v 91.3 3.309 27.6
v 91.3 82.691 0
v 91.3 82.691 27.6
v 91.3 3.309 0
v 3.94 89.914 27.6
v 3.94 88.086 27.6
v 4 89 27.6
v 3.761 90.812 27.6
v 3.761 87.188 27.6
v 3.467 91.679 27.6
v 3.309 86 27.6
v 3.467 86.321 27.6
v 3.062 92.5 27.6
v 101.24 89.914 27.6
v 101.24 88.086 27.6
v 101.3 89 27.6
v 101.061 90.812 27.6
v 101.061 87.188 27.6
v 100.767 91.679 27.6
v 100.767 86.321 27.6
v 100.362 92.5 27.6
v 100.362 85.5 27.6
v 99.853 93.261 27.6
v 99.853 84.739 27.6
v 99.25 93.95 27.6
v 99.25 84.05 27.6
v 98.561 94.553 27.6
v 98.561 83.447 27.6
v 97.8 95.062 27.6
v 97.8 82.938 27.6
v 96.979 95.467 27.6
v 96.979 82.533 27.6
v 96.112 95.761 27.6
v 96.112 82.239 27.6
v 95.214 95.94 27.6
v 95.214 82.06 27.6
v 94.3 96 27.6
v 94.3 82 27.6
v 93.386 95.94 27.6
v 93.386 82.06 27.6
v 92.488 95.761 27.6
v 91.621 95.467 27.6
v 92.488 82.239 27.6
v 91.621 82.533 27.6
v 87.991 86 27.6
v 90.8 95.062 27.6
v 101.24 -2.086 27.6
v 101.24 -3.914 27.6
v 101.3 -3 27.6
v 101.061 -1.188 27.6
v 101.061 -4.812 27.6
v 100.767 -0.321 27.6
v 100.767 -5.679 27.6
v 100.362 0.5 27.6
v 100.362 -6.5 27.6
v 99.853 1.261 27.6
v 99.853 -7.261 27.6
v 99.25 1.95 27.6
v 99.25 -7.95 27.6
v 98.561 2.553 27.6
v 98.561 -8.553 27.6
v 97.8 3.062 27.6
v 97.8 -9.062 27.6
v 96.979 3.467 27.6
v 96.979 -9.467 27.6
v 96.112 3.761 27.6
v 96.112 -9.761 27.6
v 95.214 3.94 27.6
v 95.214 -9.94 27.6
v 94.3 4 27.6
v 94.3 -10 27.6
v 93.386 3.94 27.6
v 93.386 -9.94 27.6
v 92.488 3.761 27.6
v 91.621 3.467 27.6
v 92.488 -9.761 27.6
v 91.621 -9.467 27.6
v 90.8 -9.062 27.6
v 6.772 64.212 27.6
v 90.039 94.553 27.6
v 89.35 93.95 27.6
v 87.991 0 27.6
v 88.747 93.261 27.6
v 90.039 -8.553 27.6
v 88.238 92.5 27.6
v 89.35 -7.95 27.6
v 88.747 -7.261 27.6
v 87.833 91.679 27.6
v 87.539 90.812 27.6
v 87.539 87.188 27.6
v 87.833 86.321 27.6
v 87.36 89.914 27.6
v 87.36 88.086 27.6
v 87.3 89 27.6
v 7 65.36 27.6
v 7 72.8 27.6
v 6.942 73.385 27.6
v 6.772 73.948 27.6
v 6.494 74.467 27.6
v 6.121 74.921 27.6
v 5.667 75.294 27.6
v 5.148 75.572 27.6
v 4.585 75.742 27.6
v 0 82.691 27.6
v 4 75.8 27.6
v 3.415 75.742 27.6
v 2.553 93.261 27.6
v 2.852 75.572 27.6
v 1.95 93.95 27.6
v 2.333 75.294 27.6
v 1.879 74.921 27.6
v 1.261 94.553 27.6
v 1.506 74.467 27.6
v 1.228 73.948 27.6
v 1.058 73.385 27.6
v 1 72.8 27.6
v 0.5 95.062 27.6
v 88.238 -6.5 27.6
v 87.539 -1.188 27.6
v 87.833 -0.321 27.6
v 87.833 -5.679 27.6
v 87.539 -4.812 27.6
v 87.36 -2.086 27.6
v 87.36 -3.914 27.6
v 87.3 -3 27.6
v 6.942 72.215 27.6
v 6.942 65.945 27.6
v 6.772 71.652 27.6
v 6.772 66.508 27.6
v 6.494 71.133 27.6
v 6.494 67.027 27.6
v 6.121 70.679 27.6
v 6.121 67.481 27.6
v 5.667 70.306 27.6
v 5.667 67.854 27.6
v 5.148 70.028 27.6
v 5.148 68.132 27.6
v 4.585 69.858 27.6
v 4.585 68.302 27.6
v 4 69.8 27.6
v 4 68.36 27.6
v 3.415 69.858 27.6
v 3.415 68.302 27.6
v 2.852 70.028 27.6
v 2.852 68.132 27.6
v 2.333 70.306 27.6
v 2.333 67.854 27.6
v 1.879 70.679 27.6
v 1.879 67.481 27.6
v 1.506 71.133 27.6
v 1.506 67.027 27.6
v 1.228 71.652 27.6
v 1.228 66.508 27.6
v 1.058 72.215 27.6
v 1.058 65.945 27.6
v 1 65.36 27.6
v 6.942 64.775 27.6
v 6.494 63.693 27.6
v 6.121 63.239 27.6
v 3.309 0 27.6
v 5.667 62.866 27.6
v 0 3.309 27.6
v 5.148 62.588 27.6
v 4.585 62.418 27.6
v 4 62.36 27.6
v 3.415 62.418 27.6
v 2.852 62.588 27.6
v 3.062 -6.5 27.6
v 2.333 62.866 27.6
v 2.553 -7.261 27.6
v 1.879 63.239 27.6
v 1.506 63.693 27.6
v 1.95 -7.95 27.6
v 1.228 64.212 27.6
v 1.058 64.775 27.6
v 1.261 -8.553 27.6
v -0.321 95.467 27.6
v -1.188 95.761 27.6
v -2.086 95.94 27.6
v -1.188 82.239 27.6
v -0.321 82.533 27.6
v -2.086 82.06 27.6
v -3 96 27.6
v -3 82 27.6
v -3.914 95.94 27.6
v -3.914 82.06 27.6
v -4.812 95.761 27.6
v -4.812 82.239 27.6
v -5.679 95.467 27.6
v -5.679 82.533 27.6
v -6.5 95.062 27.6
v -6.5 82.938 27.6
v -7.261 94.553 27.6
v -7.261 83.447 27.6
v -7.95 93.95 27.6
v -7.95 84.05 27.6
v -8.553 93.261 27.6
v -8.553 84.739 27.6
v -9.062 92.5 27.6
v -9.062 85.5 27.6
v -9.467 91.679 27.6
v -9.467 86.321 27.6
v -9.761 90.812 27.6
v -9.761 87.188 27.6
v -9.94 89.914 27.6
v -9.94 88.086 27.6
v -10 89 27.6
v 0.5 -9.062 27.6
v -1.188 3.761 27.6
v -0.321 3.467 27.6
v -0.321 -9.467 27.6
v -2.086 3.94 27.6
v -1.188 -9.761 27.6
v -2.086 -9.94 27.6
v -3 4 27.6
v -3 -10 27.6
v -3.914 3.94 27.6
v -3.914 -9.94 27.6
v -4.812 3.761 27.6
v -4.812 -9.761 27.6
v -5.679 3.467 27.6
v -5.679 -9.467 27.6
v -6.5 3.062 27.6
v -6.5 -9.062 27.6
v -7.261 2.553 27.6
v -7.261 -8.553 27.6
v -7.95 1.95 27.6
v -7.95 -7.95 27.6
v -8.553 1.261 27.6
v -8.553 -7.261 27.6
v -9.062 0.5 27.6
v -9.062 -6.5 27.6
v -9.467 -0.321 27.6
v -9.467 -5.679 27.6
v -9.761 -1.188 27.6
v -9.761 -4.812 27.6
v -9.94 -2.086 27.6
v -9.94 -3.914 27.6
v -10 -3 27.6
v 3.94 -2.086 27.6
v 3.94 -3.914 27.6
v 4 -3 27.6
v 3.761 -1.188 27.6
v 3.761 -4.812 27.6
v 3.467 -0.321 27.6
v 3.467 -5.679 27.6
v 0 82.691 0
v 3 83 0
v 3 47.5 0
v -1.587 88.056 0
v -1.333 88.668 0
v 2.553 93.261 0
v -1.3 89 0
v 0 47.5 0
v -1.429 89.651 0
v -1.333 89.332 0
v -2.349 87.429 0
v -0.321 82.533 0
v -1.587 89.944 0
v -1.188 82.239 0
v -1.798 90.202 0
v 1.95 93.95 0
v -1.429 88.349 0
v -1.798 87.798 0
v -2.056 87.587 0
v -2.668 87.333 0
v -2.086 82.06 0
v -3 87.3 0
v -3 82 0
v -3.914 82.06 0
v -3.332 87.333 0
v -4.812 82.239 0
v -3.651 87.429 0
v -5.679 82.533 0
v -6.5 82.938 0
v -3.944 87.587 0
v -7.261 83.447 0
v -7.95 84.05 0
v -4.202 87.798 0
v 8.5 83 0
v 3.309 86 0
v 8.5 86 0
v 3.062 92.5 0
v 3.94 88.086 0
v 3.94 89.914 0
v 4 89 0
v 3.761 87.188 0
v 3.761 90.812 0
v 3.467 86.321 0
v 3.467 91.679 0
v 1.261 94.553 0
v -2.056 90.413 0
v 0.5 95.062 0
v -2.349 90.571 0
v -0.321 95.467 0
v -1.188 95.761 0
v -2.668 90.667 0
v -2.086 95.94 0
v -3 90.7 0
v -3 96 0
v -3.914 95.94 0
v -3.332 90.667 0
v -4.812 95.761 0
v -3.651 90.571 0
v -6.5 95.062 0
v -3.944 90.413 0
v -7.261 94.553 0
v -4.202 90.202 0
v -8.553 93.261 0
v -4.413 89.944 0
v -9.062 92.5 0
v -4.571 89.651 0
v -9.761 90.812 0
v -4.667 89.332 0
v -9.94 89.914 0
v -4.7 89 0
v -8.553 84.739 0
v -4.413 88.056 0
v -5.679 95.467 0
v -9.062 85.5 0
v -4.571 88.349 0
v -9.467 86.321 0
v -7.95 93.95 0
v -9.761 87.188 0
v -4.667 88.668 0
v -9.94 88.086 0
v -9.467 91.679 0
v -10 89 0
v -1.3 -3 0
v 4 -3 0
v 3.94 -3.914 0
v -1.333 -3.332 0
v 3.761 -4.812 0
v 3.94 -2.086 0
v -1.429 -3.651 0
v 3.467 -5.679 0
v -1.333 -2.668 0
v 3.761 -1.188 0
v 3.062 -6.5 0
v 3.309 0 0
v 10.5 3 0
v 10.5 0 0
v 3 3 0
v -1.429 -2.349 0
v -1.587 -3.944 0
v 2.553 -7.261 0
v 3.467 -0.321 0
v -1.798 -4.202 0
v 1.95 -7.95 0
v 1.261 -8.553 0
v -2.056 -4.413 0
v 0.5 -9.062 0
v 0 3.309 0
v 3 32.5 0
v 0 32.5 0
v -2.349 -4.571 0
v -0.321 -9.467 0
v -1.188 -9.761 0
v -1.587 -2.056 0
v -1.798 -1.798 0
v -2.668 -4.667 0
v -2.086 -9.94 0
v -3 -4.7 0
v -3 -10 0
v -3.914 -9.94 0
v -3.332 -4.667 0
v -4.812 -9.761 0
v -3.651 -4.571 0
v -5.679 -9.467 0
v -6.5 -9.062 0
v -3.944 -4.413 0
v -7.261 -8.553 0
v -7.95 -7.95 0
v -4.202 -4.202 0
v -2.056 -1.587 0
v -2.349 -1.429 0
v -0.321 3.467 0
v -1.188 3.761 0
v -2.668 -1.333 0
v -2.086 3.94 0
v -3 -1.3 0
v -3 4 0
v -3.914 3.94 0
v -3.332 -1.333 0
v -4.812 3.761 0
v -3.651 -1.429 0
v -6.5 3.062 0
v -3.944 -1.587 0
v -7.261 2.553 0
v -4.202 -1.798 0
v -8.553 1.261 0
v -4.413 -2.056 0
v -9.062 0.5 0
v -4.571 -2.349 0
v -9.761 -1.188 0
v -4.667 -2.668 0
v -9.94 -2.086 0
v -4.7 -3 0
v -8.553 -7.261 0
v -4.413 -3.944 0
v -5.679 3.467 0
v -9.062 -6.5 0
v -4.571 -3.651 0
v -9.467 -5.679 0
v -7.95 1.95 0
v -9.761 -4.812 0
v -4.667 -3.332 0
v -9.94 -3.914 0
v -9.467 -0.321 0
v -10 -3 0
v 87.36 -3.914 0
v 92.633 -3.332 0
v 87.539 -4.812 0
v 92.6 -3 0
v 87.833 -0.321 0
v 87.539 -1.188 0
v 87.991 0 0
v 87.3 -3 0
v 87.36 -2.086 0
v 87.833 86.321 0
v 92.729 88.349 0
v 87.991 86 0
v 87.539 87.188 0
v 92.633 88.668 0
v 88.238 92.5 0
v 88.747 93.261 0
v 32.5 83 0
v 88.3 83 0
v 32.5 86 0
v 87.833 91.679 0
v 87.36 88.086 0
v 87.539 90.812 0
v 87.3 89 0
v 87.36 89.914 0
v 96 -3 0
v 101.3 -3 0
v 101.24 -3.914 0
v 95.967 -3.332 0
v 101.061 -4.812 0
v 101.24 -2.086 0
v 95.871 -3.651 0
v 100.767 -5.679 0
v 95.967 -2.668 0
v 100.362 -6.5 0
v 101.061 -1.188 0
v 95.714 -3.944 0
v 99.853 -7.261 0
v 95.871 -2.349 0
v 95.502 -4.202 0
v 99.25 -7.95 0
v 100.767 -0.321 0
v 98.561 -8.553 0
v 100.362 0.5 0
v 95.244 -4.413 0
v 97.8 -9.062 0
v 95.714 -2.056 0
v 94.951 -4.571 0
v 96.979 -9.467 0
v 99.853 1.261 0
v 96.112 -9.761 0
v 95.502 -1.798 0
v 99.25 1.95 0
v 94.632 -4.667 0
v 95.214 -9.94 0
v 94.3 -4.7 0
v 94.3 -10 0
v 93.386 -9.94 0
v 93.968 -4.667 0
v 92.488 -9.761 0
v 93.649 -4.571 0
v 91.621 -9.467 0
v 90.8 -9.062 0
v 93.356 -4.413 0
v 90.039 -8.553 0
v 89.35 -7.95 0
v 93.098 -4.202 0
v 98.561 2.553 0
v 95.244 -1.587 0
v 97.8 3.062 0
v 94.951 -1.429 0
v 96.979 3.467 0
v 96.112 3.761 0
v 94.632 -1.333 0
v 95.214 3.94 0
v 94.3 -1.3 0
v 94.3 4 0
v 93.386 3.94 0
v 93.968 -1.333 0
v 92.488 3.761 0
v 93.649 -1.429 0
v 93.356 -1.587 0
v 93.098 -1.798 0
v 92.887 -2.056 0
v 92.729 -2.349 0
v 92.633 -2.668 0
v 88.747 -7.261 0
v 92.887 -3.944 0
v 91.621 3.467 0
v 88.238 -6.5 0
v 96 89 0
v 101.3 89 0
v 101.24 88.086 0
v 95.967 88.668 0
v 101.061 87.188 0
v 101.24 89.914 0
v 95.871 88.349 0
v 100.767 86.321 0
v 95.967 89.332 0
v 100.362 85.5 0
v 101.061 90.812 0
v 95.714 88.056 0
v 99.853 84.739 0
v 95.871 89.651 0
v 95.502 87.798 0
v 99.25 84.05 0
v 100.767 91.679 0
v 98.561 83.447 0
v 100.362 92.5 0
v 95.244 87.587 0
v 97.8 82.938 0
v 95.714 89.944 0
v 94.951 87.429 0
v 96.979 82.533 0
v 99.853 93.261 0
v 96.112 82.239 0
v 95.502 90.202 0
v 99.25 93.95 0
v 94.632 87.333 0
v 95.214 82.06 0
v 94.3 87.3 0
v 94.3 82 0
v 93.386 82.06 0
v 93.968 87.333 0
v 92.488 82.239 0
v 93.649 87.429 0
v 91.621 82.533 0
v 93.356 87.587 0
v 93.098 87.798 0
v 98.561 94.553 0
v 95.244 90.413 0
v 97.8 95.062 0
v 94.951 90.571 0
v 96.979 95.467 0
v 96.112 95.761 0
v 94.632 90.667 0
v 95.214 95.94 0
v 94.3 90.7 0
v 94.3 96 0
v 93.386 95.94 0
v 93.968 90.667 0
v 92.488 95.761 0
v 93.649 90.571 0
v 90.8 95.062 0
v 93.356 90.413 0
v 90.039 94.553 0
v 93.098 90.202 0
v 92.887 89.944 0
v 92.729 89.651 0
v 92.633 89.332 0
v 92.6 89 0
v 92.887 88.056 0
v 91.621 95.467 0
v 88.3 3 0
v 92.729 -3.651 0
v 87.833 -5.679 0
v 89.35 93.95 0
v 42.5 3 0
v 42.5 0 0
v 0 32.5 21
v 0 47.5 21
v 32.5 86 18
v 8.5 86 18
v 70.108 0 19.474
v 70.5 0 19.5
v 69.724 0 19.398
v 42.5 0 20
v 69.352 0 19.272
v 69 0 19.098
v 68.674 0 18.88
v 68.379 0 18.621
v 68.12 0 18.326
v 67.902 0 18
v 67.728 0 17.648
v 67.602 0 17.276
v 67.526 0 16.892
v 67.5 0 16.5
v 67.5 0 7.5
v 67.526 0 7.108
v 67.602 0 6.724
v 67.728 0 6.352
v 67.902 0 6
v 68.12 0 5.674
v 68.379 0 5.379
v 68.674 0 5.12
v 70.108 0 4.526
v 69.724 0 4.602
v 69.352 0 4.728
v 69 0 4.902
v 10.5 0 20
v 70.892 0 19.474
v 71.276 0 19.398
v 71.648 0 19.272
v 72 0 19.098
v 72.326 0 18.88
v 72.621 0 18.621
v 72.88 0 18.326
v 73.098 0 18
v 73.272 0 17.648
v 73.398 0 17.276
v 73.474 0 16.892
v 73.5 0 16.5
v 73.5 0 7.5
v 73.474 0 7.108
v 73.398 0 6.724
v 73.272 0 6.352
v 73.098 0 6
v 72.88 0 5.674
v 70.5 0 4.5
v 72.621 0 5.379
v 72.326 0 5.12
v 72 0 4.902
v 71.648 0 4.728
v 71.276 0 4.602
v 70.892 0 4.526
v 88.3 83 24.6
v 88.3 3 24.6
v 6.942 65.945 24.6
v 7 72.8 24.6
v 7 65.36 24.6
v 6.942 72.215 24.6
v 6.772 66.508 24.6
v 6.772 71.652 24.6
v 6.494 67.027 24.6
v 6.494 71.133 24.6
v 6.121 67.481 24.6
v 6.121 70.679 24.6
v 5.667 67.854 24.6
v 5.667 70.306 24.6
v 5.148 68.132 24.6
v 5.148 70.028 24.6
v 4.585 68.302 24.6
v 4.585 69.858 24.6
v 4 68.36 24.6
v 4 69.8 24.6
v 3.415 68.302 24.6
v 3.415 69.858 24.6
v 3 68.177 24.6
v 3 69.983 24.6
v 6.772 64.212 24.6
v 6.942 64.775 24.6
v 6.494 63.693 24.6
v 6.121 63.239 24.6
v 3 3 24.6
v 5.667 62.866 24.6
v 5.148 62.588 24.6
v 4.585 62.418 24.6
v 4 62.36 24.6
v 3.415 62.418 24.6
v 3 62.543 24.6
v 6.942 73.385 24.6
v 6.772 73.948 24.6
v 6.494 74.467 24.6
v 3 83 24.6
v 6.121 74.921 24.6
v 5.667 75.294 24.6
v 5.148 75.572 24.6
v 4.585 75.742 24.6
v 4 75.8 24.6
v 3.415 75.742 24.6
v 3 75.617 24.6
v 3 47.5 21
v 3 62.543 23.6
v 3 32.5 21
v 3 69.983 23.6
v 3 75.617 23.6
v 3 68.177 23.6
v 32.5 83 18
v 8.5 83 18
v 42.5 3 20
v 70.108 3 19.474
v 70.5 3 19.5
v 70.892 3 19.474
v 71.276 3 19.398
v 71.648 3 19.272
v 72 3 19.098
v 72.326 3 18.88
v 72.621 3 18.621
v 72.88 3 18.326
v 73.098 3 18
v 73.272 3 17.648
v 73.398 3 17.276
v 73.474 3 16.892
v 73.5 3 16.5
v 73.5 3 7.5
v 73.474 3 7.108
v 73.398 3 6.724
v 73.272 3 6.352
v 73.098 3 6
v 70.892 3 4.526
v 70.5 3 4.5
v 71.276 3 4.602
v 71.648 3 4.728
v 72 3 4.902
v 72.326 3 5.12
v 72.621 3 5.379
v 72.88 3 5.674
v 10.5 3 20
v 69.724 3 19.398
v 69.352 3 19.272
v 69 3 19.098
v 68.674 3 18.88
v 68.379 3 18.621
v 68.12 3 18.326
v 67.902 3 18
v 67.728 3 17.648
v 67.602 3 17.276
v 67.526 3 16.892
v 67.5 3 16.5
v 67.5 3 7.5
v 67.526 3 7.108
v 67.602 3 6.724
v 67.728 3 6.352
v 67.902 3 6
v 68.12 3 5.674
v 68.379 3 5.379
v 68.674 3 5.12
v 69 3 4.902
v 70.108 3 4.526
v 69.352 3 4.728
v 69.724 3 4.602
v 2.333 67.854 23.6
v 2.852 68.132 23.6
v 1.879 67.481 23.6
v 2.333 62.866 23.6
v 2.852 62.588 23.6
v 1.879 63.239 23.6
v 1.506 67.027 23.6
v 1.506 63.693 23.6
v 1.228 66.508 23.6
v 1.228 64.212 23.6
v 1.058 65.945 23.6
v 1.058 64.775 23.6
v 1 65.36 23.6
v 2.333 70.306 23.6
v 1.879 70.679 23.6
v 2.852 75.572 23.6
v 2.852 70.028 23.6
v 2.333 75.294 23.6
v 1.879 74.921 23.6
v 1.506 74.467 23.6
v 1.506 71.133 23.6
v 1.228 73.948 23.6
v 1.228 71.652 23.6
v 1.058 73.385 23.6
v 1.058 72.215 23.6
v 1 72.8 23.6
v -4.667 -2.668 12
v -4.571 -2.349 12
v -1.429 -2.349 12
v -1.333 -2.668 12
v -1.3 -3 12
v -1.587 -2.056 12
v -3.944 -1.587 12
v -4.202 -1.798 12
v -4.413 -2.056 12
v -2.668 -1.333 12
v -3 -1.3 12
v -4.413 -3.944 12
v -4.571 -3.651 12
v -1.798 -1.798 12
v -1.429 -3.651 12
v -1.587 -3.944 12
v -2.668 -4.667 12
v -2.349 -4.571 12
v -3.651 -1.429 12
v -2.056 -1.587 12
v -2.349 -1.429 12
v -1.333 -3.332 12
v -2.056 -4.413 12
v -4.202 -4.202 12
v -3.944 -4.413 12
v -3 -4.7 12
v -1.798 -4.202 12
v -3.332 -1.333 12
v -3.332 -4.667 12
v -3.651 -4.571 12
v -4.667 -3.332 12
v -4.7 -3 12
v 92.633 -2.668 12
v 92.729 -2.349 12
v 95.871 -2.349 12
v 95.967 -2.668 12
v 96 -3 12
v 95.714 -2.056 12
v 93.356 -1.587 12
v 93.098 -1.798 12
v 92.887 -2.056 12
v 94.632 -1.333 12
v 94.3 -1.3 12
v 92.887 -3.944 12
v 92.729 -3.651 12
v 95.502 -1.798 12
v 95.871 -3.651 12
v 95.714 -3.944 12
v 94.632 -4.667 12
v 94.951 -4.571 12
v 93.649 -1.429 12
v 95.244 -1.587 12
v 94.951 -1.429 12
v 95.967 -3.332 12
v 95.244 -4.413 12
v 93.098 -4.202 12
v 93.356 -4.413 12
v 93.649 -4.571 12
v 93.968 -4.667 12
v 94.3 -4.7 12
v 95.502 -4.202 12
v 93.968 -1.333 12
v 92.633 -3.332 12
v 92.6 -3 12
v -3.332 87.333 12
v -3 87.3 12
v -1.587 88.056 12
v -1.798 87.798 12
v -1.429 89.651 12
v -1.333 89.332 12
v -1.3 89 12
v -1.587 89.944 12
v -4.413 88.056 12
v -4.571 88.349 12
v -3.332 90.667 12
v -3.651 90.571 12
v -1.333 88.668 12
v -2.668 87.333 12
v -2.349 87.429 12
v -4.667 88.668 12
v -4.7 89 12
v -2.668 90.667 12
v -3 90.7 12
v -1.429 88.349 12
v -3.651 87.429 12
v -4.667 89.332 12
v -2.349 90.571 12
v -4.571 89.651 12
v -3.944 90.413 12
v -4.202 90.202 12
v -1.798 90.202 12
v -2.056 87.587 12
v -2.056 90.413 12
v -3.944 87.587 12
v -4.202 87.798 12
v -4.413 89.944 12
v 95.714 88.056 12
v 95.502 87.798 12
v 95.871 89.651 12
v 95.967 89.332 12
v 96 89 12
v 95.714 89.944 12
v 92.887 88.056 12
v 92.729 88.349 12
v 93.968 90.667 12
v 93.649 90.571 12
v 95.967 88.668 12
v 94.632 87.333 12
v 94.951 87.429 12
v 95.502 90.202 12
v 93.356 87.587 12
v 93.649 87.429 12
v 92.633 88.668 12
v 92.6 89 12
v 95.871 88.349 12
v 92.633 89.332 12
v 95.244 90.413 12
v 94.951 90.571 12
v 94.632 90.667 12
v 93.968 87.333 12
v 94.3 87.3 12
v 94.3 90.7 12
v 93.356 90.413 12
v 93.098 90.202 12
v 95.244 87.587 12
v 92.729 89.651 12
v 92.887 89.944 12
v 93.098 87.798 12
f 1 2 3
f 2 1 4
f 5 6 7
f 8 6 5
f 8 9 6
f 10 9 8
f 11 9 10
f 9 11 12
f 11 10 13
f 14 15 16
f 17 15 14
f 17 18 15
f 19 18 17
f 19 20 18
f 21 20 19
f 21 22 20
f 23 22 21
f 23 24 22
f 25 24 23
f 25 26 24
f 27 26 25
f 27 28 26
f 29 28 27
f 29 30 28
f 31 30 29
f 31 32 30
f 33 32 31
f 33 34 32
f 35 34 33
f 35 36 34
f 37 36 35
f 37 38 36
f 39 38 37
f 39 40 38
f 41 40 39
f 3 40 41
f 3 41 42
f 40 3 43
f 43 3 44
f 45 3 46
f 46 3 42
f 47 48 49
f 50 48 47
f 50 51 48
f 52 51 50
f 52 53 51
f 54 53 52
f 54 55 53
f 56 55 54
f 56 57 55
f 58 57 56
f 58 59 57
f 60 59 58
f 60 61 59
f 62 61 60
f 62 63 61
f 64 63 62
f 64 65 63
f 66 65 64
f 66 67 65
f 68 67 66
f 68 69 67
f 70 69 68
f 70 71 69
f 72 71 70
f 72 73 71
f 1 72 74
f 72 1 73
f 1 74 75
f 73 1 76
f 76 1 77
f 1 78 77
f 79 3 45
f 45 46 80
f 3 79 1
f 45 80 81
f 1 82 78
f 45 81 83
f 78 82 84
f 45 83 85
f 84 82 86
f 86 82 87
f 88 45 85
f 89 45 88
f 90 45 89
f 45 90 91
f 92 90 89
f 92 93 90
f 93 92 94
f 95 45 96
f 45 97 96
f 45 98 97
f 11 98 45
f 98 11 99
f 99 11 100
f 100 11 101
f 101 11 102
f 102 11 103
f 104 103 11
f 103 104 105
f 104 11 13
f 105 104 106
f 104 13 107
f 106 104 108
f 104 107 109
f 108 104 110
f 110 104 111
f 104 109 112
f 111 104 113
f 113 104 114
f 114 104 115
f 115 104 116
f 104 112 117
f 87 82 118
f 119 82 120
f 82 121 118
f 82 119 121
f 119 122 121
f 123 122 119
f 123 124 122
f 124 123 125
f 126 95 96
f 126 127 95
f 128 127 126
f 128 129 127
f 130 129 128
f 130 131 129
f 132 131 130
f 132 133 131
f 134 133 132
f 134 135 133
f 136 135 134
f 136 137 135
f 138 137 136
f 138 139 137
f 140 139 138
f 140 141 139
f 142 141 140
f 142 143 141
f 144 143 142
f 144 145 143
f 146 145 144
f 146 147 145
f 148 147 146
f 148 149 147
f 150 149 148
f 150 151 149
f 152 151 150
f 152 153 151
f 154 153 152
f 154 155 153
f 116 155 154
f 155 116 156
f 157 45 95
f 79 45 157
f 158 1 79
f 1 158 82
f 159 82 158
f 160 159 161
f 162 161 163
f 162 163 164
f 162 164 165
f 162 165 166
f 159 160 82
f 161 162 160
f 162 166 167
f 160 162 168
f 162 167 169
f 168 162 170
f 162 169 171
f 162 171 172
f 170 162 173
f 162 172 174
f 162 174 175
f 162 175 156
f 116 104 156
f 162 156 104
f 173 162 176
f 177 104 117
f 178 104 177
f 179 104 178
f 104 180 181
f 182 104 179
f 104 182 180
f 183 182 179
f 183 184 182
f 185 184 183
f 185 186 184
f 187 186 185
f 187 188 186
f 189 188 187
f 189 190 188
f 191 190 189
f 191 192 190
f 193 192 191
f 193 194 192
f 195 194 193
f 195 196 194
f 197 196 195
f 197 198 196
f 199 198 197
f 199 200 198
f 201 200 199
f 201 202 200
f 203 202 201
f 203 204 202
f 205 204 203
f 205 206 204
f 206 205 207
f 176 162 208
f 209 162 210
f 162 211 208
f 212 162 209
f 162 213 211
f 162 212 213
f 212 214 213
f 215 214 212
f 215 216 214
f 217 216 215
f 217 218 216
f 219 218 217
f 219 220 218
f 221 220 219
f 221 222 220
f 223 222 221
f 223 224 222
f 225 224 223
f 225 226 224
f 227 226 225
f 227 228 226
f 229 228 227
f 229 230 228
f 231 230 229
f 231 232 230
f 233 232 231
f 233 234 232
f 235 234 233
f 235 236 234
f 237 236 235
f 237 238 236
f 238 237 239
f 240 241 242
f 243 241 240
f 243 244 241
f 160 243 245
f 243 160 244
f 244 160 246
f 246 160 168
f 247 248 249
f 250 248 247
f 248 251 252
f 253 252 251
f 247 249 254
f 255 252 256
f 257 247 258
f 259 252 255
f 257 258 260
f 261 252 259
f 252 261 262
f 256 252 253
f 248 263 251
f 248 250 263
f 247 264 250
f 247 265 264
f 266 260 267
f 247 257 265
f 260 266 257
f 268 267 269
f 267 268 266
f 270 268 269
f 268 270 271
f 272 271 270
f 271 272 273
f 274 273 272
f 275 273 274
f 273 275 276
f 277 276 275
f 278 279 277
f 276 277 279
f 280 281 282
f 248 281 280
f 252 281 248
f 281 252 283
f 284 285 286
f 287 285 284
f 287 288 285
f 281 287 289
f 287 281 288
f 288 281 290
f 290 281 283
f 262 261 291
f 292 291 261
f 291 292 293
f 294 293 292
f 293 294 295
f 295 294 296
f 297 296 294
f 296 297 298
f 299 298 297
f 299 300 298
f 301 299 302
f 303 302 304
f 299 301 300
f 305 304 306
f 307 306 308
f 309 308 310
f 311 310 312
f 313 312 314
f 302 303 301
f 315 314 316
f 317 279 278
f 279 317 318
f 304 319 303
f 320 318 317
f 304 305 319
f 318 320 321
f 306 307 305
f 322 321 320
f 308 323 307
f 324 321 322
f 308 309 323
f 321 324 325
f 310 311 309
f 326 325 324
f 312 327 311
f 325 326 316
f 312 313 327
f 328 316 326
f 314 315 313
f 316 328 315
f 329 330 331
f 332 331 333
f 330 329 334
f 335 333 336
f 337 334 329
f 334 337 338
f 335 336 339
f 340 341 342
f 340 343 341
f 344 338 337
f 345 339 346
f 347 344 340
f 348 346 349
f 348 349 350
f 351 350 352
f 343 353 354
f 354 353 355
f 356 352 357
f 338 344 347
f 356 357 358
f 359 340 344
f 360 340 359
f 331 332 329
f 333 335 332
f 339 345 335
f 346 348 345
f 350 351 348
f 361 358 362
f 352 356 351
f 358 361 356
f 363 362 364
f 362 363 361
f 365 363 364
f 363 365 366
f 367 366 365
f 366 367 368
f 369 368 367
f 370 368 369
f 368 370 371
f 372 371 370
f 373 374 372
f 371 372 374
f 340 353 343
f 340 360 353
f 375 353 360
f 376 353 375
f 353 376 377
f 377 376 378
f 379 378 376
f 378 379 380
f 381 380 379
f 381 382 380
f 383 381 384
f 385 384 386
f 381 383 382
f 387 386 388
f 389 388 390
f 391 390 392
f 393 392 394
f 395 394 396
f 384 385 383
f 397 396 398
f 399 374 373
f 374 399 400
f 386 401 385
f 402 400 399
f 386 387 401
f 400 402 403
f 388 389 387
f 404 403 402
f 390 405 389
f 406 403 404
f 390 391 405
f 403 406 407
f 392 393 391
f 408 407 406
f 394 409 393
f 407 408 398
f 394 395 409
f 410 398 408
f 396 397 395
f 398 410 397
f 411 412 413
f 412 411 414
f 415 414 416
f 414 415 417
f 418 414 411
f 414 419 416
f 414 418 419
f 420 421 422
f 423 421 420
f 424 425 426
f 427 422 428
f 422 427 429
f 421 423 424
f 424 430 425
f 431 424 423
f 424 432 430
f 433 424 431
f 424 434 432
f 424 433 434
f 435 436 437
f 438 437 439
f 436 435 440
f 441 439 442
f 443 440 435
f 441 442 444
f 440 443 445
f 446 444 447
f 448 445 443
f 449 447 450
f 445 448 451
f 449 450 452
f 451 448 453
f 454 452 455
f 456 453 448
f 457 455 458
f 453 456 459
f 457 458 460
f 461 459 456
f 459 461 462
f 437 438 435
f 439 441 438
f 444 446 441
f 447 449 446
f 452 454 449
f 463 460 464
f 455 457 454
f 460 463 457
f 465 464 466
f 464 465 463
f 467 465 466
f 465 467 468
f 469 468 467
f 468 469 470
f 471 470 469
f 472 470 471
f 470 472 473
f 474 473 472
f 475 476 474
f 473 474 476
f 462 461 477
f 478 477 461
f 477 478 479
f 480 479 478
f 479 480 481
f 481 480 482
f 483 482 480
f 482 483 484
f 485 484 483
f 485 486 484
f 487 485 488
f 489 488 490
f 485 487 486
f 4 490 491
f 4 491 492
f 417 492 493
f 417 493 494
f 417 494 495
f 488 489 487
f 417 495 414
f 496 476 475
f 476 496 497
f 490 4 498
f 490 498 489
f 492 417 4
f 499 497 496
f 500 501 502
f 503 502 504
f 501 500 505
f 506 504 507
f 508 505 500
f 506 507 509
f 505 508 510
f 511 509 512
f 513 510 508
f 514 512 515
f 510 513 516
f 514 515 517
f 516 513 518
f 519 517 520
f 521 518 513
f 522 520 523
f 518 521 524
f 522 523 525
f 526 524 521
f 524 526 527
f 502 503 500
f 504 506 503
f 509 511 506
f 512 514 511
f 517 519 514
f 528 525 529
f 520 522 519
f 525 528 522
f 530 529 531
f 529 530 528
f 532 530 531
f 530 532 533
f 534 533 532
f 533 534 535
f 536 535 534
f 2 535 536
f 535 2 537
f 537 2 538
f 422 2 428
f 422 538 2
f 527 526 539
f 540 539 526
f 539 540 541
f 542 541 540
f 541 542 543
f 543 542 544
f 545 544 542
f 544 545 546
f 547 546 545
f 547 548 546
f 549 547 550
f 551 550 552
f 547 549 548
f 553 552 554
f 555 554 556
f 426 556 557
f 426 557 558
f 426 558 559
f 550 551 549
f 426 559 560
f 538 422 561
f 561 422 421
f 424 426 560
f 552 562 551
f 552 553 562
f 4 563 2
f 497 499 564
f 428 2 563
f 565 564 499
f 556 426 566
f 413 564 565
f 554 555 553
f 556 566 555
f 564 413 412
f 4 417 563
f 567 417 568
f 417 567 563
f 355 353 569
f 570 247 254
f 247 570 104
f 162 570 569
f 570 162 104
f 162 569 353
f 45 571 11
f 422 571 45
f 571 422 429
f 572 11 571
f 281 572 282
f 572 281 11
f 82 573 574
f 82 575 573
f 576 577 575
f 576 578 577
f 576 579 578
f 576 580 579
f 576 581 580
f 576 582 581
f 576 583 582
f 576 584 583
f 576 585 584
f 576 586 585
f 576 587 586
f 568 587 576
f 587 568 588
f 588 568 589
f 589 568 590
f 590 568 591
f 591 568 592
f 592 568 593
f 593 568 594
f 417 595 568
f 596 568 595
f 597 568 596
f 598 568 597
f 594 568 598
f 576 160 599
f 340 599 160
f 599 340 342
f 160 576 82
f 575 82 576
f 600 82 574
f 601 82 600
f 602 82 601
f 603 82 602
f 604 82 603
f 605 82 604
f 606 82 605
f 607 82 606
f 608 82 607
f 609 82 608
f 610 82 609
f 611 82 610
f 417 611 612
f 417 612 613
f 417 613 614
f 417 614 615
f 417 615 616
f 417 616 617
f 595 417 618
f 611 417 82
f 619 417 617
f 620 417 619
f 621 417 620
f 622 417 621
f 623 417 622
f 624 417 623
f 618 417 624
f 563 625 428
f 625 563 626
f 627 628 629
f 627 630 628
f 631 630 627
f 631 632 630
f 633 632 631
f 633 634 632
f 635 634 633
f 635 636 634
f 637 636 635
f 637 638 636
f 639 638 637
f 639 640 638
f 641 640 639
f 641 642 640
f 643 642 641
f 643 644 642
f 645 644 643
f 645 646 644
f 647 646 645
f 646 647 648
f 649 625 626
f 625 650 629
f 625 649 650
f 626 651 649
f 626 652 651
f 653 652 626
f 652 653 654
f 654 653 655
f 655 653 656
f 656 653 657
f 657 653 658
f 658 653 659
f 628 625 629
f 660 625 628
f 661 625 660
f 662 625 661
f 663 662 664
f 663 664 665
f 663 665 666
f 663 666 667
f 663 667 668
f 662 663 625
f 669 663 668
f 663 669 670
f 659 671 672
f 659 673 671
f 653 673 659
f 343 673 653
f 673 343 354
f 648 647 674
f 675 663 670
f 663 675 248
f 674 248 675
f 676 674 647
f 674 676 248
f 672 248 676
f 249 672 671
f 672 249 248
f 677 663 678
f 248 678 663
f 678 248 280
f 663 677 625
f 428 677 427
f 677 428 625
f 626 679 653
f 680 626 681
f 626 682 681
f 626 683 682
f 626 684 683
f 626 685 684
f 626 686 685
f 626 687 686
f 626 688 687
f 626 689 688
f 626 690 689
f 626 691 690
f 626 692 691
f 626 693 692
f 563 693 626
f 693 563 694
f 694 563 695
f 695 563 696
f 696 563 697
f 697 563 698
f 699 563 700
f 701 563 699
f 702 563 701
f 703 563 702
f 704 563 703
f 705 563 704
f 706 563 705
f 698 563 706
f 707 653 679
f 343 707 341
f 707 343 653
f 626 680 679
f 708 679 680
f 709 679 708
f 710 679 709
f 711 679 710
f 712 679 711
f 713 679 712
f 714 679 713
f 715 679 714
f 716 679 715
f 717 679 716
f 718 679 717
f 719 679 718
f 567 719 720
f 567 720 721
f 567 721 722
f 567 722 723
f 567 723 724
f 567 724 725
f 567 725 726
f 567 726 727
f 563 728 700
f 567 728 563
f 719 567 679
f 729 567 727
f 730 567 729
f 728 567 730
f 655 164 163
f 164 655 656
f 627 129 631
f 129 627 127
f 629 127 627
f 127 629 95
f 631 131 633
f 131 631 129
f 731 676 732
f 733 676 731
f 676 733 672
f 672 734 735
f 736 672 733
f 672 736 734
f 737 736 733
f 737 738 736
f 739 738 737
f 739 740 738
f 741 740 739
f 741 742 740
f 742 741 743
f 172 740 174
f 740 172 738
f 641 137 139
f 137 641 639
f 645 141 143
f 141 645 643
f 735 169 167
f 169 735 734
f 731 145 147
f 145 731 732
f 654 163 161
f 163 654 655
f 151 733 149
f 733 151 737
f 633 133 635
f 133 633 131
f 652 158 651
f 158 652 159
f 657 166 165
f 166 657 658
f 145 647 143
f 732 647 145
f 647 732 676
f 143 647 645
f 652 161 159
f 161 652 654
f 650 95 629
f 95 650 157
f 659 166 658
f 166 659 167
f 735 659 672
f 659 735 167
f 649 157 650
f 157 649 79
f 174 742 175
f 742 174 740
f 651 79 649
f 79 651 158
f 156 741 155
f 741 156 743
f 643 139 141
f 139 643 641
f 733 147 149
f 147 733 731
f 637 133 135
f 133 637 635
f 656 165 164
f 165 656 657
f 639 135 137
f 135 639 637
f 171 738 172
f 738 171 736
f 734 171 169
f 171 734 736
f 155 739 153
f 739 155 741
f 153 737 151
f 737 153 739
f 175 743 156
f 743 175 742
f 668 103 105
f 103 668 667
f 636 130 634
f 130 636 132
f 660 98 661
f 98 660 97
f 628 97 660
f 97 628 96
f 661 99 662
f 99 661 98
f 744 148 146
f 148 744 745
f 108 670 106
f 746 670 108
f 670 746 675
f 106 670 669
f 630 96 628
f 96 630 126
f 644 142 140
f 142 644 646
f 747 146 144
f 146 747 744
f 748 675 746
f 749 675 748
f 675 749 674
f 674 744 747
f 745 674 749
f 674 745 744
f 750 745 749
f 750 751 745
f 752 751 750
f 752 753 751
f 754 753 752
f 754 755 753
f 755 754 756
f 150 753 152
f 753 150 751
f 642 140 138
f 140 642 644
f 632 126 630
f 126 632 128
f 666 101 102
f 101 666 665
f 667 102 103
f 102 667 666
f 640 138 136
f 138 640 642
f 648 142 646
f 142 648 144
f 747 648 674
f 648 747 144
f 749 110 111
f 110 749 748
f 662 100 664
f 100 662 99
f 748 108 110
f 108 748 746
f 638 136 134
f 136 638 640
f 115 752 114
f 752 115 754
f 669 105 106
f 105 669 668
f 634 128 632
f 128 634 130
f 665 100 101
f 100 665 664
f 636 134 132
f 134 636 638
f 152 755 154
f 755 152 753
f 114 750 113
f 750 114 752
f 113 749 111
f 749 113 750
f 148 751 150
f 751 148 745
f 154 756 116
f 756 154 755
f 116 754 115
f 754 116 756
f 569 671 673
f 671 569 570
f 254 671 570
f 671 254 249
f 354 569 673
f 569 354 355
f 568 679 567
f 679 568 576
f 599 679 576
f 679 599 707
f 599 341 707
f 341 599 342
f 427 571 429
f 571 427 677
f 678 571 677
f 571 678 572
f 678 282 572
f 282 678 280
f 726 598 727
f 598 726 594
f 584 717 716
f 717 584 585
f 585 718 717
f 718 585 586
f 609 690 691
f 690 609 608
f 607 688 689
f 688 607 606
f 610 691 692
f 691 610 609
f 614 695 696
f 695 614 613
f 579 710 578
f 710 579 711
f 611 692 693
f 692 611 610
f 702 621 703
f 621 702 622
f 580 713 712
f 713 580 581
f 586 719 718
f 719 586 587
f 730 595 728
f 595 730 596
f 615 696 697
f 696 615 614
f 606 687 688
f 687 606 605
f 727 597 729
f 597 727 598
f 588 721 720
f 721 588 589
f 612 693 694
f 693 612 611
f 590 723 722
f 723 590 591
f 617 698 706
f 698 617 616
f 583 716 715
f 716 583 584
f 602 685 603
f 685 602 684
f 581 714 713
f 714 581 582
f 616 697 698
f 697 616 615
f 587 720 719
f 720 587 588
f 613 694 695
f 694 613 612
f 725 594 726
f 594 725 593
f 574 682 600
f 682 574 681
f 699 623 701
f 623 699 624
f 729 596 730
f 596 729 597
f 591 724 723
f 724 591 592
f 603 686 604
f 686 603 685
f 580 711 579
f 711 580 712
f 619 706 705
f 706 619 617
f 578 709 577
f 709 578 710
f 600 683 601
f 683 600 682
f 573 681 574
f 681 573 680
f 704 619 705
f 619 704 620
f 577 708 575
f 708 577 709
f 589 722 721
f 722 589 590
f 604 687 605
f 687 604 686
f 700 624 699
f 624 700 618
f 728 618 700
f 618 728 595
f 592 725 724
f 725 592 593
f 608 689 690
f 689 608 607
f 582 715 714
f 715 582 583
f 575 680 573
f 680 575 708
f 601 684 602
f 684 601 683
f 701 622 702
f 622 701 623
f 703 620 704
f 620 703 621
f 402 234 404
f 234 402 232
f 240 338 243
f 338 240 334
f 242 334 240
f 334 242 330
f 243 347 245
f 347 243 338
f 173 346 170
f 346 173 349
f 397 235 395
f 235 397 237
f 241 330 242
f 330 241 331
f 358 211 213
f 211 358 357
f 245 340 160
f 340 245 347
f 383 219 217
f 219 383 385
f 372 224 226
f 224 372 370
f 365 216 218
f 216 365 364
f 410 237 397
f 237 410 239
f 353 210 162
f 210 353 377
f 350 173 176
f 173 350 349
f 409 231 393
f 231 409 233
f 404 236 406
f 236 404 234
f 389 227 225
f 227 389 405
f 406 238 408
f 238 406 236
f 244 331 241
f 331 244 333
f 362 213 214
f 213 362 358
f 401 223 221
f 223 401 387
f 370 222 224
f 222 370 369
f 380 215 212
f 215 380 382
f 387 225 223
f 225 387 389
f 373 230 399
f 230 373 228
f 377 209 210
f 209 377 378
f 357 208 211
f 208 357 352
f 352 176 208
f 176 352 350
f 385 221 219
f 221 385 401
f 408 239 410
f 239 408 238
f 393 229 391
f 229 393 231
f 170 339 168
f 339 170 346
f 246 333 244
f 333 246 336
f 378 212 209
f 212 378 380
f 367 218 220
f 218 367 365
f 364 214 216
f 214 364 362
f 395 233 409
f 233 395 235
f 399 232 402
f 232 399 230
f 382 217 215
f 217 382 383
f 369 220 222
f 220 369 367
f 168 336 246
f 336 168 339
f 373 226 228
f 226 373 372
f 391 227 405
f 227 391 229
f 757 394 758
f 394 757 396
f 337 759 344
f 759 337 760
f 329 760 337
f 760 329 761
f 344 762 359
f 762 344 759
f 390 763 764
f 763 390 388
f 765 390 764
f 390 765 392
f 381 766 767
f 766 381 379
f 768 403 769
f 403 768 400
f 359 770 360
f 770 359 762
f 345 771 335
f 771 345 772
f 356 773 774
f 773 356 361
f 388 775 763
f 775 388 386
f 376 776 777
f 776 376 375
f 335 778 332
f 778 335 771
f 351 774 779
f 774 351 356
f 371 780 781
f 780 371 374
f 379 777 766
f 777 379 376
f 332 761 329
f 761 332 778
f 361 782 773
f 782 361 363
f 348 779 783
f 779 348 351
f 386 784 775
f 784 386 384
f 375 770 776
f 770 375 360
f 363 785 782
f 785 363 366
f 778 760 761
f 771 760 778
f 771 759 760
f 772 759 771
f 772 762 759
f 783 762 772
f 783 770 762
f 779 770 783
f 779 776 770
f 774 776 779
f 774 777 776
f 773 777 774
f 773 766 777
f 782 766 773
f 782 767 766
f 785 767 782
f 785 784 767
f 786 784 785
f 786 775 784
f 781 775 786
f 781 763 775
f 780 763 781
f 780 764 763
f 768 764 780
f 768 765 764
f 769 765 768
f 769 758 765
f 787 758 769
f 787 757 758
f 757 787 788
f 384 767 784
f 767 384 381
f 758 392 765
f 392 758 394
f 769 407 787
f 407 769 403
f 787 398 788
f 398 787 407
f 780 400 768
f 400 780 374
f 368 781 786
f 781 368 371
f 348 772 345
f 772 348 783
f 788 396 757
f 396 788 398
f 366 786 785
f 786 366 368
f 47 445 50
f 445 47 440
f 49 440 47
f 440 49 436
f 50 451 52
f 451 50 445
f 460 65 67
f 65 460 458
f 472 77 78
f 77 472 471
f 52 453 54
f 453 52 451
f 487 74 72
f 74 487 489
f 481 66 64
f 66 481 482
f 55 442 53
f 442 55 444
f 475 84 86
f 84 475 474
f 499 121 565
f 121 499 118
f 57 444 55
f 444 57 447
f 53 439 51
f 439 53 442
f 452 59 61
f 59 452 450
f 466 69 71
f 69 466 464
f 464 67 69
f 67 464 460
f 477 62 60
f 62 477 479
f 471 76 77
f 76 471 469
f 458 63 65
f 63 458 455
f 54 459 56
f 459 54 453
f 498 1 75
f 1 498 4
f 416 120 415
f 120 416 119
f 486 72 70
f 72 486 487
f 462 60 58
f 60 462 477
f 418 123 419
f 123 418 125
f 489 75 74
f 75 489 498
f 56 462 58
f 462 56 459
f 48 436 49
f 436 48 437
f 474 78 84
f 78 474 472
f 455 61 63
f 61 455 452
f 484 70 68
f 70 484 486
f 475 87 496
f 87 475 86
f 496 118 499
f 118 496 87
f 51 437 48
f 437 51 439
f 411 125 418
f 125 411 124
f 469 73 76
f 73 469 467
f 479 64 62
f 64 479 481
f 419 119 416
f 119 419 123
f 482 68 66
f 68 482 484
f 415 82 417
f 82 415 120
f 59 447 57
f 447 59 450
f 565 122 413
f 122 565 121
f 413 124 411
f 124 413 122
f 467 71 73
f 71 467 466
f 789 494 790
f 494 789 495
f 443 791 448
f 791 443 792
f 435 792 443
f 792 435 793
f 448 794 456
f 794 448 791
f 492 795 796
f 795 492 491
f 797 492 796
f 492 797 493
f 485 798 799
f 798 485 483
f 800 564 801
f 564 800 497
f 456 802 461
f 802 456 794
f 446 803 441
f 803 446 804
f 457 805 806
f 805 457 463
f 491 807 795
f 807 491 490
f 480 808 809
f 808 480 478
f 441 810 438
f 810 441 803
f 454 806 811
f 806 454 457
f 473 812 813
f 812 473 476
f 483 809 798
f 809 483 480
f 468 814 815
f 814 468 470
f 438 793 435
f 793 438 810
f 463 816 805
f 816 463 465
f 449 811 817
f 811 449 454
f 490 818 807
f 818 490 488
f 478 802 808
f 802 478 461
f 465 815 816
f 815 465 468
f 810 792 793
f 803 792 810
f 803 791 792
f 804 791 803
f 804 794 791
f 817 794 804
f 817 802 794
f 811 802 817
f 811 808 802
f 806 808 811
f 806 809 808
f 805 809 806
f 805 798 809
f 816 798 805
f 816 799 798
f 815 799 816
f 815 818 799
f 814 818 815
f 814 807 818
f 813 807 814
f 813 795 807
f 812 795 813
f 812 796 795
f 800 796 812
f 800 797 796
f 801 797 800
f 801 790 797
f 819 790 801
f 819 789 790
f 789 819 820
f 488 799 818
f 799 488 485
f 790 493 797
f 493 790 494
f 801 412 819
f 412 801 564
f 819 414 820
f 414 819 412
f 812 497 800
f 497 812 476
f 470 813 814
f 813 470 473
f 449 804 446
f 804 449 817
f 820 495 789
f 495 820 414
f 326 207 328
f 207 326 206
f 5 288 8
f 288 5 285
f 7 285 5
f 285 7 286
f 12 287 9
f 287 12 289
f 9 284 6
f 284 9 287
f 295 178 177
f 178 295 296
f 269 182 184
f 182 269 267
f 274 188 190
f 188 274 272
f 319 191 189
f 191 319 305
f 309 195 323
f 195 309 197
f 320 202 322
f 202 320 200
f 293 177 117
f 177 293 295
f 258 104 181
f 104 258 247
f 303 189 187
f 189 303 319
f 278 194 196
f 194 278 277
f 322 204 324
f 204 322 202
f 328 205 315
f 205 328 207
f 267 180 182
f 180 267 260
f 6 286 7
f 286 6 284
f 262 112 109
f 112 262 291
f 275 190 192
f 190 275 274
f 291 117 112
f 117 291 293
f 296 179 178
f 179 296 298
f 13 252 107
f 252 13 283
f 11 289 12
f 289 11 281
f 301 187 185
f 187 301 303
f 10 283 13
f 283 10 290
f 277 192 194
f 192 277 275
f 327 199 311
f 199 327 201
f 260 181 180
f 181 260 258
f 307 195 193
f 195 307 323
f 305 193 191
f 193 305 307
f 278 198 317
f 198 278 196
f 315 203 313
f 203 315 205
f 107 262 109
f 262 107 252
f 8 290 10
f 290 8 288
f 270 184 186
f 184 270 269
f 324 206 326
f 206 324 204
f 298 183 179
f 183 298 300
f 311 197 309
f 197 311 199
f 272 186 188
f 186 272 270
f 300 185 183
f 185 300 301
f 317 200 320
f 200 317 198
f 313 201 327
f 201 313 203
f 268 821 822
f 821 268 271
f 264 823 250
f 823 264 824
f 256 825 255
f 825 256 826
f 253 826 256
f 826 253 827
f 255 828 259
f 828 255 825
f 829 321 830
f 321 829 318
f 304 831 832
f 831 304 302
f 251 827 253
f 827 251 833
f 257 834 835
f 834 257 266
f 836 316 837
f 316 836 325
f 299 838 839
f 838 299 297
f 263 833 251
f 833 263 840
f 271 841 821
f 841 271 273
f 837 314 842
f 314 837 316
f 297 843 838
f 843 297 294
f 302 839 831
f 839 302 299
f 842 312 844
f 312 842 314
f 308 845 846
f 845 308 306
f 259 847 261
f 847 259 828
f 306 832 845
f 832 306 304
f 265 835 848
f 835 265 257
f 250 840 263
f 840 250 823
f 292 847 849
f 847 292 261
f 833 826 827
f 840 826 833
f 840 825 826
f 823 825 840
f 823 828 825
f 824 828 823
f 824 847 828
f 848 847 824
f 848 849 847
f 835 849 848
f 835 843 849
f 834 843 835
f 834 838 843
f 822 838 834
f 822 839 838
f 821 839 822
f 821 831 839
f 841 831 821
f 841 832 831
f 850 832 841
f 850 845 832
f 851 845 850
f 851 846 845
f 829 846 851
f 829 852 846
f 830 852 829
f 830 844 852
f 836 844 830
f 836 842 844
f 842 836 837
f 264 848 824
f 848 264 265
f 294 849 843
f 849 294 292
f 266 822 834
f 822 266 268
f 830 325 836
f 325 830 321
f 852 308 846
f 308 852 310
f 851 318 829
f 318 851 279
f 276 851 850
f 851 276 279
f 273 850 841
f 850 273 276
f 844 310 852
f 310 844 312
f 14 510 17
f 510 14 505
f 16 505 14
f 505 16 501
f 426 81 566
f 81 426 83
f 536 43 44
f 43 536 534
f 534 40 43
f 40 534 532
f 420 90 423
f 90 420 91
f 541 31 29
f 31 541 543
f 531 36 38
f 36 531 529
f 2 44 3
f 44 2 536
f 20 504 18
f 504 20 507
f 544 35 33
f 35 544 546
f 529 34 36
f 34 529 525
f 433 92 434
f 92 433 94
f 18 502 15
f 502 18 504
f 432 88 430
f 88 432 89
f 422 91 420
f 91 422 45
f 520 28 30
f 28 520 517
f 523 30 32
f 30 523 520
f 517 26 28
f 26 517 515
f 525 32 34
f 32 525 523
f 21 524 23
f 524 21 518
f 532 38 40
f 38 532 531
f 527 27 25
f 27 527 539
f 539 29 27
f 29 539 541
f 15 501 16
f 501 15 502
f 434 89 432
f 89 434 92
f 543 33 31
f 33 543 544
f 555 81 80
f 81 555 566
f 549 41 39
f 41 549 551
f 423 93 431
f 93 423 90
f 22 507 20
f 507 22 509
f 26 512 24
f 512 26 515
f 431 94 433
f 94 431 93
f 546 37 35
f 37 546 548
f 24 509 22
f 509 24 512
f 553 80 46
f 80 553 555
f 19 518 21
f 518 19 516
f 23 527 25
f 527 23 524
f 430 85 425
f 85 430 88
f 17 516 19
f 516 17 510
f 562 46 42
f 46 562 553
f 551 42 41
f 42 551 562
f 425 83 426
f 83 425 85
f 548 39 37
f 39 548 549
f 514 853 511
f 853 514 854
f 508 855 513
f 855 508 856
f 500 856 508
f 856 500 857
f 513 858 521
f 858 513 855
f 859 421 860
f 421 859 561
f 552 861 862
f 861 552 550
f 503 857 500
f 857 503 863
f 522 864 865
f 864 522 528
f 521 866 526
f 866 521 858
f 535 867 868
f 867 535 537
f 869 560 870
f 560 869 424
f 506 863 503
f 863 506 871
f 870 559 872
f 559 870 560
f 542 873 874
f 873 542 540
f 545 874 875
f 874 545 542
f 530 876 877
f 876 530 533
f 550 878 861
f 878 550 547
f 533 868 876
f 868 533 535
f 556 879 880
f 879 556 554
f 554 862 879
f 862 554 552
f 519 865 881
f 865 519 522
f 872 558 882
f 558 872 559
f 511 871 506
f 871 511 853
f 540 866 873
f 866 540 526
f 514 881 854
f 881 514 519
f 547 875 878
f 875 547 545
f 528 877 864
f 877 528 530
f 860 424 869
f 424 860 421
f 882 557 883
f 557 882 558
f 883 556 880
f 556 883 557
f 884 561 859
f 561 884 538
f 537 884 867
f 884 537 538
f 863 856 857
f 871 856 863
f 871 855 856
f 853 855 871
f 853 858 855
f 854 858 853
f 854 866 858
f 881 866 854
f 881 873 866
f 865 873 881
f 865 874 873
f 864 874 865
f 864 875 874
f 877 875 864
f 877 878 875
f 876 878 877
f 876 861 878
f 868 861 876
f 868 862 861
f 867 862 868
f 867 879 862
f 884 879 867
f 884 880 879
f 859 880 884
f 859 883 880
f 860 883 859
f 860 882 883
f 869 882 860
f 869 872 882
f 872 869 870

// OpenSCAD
// ============================================================
// Gabinete - ModemEYSE4G_LTE_Cat1_simA7670SA - TAPA/CUBIERTA V1
// (REESTRUCTURACION: inversion de componentes)
//
// Origen de este archivo: gabinete_ModemEYSE4G_base_0A.scad (la base
// con paredes). En el nuevo esquema de 2 piezas, esta pieza va
// COLOCADA ENCIMA, BOCA ABAJO, como una cubierta tipo "taza invertida":
// el piso original de base_0A pasa a ser el TECHO de esta pieza, y las
// paredes cuelgan HACIA ABAJO desde ese techo hasta un borde/reborde
// abierto que apoya sobre gabinete_ModemEYSE4G_base_V1.scad (el plato
// plano con las torretas del PCB).
//
// === LOGICA DE LA INVERSION (leer antes de revisar los calados) ===
// NO se aplica ningun rotate()/mirror() al modulo de base_0A tal cual
// estaba escrito. En cambio, esta pieza se AUTORIA DE NUEVO ya en su
// orientacion final de uso (techo arriba, paredes colgando, borde
// abierto en Z=0), reutilizando los mismos parametros/formas de
// base_0A pero con la cavidad tallada en el sentido opuesto de Z.
//
// Por que esto NO requiere espejar X ni Y (solo Z):
// Fisicamente, dar vuelta una pieza real "boca abajo" siempre implica
// rotarla 180 grados alrededor de un eje horizontal - lo cual espeja
// simultaneamente Z Y uno de los dos ejes horizontales (X o Y, segun
// el eje de giro elegido). Pero aca no estamos rotando un objeto ya
// impreso: estamos generando la geometria DIRECTAMENTE en su
// orientacion de ensamblaje final. Como el plato base_V1.scad usa las
// mismas coordenadas X,Y (sin espejar) para sus torretas, esta pieza
// tiene que usar EXACTAMENTE esas mismas X,Y para que las paredes y
// ventanas queden alineadas con los conectores reales del PCB montado
// sobre esas torretas - espejar X o Y aca las desalinearia. Lo UNICO
// que cambia es la referencia de altura (Z): antes se medida "desde
// el piso hacia arriba" (pcb_top_z, con Z=0 en el piso de base_0A);
// aca se mide "desde el borde/reborde hacia arriba" (pcb_top_z_from_rim,
// con Z=0 en el borde que apoya sobre base_V1.scad). Ver mas abajo.
//
// AVISO PARA REVISION: Damian senalo este punto como clave. Esta es
// la interpretacion de ingenieria aplicada - revisar antes de imprimir.
//
// Cambios respecto a base_0A.scad:
//   a) box_ext_height ajustado (ver historial mas abajo, ultimo valor:
//      25mm de altura EXTERIOR total, instruccion final de Damian).
//   b) Se agregaron los calados de LED D2/D3 (ahora se ven a traves
//      del techo de esta pieza).
//   c) y d) Se recalcularon las ventanas de conectores. J1, J5, J2 y
//      el USB-C de U5 son ranuras "U invertida" ABIERTAS hacia abajo
//      (llegan hasta Z=0, el borde) para que la cubierta pueda bajar
//      verticalmente sobre los conectores ya montados sin chocar. J4
//      (SMA) es una ventana cerrada tradicional (flotando en la
//      pared), con holgura de 0.5mm por lado en base a su datasheet.
//   d) NO se tocaron los calados J1/J5/J2 en el archivo base_0B/base_V1
//      - esos calados ya no existen ahi, todos los conectores ahora
//      se calan aca, en la cubierta.
//
// CORRECCION v1 (2da pasada, reportada por Damian): dos errores reales
// de ubicacion, detectados al revisar de nuevo la rotacion de los
// footprints en el .kicad_pcb:
//
//   1) LEDs D2/D3: se habia intentado calarlos como agujero HORIZONTAL
//      en la pared X=0 (por su rotacion -90 en el .kicad_pcb) - esto
//      se REVIRTIO despues (ver mas abajo): Damian aclaro que se ven
//      desde ARRIBA, van como agujero VERTICAL en el techo.
//   2) USB-C de U5: estaba calado en la pared X=outer_x. Damian
//      confirmo que el USB-C va del MISMO lado que los LEDs (pared
//      X=0, "lado frontal"). Se corrige: se mueve el calado a la
//      pared X=0, usando el mismo conn_usbc_y=44.1 ya verificado
//      antes (ese valor no depende de en que pared se corte, solo
//      indica la posicion a lo largo de la pared).
//      NOTA: se habia intentado re-derivar la posicion X del USB-C
//      proyectando la muesca del courtyard del footprint U5 a traves
//      de su rotacion de 90 grados - pero esa derivacion depende del
//      signo de la formula de rotacion (ambiguo sin poder render-ear
//      el footprint) y de que el courtyard generico de "Raspberry Pi
//      Pico" represente fielmente el USB-C de la Black Pill (no es
//      100% seguro que lo haga). Por eso NO se uso ese resultado -
//      se aplico directamente la instruccion de Damian (mismo lado
//      que los LEDs) en vez de una derivacion propia poco confiable.
//
//   J1, J5 (pared Y=0) y J2, J4 (pared Y=board_y) NO se movieron: su
//   cercania real a esas paredes (4.5-10mm para J1/J5, 4-8mm para
//   J2/J4, tomada directo del .kicad_pcb) ya los ubica correctamente
//   ahi.
//
// TERMINOLOGIA Y UBICACION DEFINITIVA (2026-09-17, version final dada
// por Damian - pisa cualquier lectura anterior de fotos/renders):
//   Frontal = X=0 (LEDs D2/D3 + USB-C)
//   Izquierdo = Y=85 (J1 + J5) - CORREGIDO: antes J2/J4
//   Derecho = Y=0 (J2 + J4) - CORREGIDO: antes J1/J5
//   Trasero = X=90.3 (vacio)
// LEDs: coordenadas finales dadas directamente por Damian, D2=(3.5,
// 64.86), D3=(3.5,72.3) - distintas de las que se habian verificado
// contra el .kicad_pcb (17.6/10.16).
//
// CAMBIO DE FUENTE DE DATOS (2026-09-17, decision explicita de
// Damian): de aca en mas se usa la revision "Gerber Files V1" del PCB
// (GPRS_SIM_A7670SA_kicad/Gerber Files V1/Modulo_SIMA7670SA.kicad_pcb,
// placa 90.30 x 85.00mm), NO la revision "definitiva" de 92.0mm usada
// hasta el paso anterior. Damian aporto una tabla de coordenadas ya
// verificada dato por dato contra ese archivo:
//   J1 (23.726,4.446)  J2 (30.960,76.830)  J3/U.FL (70.685,74.395)
//   J4 (70.680,80.640) J5 (14.911,10.446)  D2 (3.500,17.600)
//   D3 (3.500,10.160)  H1-H4 (ver base_V1.scad)
// El unico cambio real de posicion relevante para este archivo es J1
// (antes 28.7mm en X, ahora 23.726mm - la revision "Gerber V1" tiene
// el borne de alimentacion en otro lugar que la revision "definitiva").
// J5, J2, J4, D2, D3 dan practicamente identicos entre ambas
// revisiones del PCB. J3/U.FL es un conector interno (antena), NO
// necesita calado en el gabinete - se deja documentado, sin cutout.
// board_x paso de 92.0 a 90.30mm (afecta outer_x y el ancho de la
// pared X=0/X=outer_x, pero NO reposiciona J1/J5/J2/J4 porque estan
// todos referenciados por su propia coordenada, no por board_x).
// ============================================================


// ============================================================
// Gabinete - ModemEYSE4G_LTE_Cat1_simA7670SA - TAPA/CUBIERTA V1.7
// (RESTAURACIÓN: Ventana cerrada tradicional para J4 hasta Z=15mm máx)
// ============================================================

// ---------- PARAMETROS DE LA PLACA ----------
board_x = 90.3;           // ancho de la placa (mm) - Gerber Files V1
board_y = 85.0;          // alto de la placa (mm)
board_thickness = 1.6;   // espesor del PCB (mm)

// ---------- PARAMETROS DEL GABINETE RECORTADO ----------
wall = 3.0;              // espesor de las paredes que bajan del techo (mm)
floor_thickness = 3.0;   // espesor del TECHO de esta pieza (mm)
floor_to_board = 3;      // altura de las torretas de soporte en la base (mm)

// ---------- ALTURA FIJA DEL GABINETE (EJE Z) ----------
altura_interior_tapa = 20.0 + board_thickness + floor_to_board; // = 24.6mm
box_ext_height = altura_interior_tapa + floor_thickness;       // = 27.6mm

// ---------- MARGENES DE CORTE (Identicos a la Base) ----------
clearance_corte = 0.5; 
outer_x = board_x + 2 * clearance_corte; // = 91.3mm
outer_y = board_y + 2 * clearance_corte; // = 86.0mm
offset_x = clearance_corte; 
offset_y = clearance_corte;

// ---------- LEDS (calado vertical en el TECHO) ----------
mirror_x = false;
function mx(x) = mirror_x ? (board_x - x) : x;

led_D2 = [mx(3.5), 64.86];
led_D3 = [mx(3.5), 72.3];
led_hole_d = 6.0; 

// ---------- DIMENSIONES DE VENTANAS ----------

// 1. USB-C (Pared X = 0, Lado Frontal) -> Rango: 32mm < Y < 47mm ; 0 < Z < 21mm
conn_usbc_y1 = 32.0;
conn_usbc_y2 = 47.0;
conn_usbc_w = conn_usbc_y2 - conn_usbc_y1; 
conn_usbc_center_y = (conn_usbc_y1 + conn_usbc_y2) / 2;
conn_usbc_top_z = 21.0;

// 2. DB9 J2 (Pared Y = 0, Lado Derecho) -> Rango: 10mm < X < 42mm ; 0 < Z < 20mm
conn_J2_x1 = 10.0;
conn_J2_x2 = 42.0;
conn_J2_w = conn_J2_x2 - conn_J2_x1; 
conn_J2_center_x = (conn_J2_x1 + conn_J2_x2) / 2;
conn_J2_top_z = 20.0;

// 3. Alimentación J1/J5 (Pared Y = outer_y, Lado Izquierdo) -> Rango: 8mm < X < 32mm ; 0 < Z < 18mm
conn_J1J5_x1 = 8.0;
conn_J1J5_x2 = 32.0;
conn_J1J5_w = conn_J1J5_x2 - conn_J1J5_x1; 
conn_J1J5_center_x = (conn_J1J5_x1 + conn_J1J5_x2) / 2;
conn_J1J5_top_z = 18.0;

// 4. Antena J4 VENTANA CERRADA TRADICIONAL (Pared Y = 0, Lado Derecho) -> Rango: 67mm < X < 73mm
conn_J4_x1 = 67.0;
conn_J4_x2 = 73.0;
conn_J4_w = conn_J4_x2 - conn_J4_x1; // Ancho nominal = 6mm
conn_J4_center_x = (conn_J4_x1 + conn_J4_x2) / 2;
conn_J4_top_z = 15.0; // Altura máxima al arco superior

// Altura total del cuerpo de la cápsula para la ventana cerrada original (J4 original medía 15mm de alto)
conn_J4_slot_h = 15.0; 
// Ajuste matemático de Z: Centro = Altura máxima (15) - Radio superior (conn_J4_w/2 = 3)
conn_J4_sma_z = conn_J4_top_z - (conn_J4_w / 2); // = 12.0mm

// ============================================================
// MODULOS
// ============================================================

// Módulo cápsula 2D restaurado para la ventana cerrada original de J4
module capsula_2d(w, h) {
    hull() {
        translate([0, (h - w) / 2]) circle(d = w, $fn = 48);
        translate([0, -(h - w) / 2]) circle(d = w, $fn = 48);
    }
}

// ---------- OREJITAS DE SUJECION TAPA-BASE ----------
ear_pilot_d = 3.4;
ear_d = 14;
ear_reach = 3;
ear_pilot_depth = 12; 

ear_centers = [
    [-ear_reach, -ear_reach],
    [outer_x + ear_reach, -ear_reach],
    [-ear_reach, outer_y + ear_reach],
    [outer_x + ear_reach, outer_y + ear_reach]
];

module orejita_tapa_v1(p) {
    difference() {
        translate([p[0], p[1], 0])
            cylinder(h = box_ext_height, d = ear_d, $fn = 48);
        translate([p[0], p[1], -1])
            cylinder(h = ear_pilot_depth + 1, d = ear_pilot_d, $fn = 32);
    }
}

module orejitas_tapa_v1() {
    for (p = ear_centers) orejita_tapa_v1(p);
}

// Estructura principal de la Cubierta tipo "Taza Invertida"
module tapa_v1_recortada() {
    difference() {
        // Bloque exterior sólido e interior vaciado
        difference() {
            cube([outer_x, outer_y, box_ext_height]);
            translate([wall, wall, -1])
                cube([outer_x - 2*wall, outer_y - 2*wall,
                      box_ext_height - floor_thickness + 1]);
        }

        // ---- Calados de LED (Verticales en el techo) ----
        translate([led_D2[0] + offset_x, led_D2[1] + offset_y, box_ext_height - floor_thickness - 1])
            cylinder(h = floor_thickness + 2, d = led_hole_d, $fn = 32);
        translate([led_D3[0] + offset_x, led_D3[1] + offset_y, box_ext_height - floor_thickness - 1])
            cylinder(h = floor_thickness + 2, d = led_hole_d, $fn = 32);

        // ---- CORTES EN "U INVERTIDA" RECTANGULARES ----

        // 1. Frente (X = 0): Calado USB-C
        translate([-1, conn_usbc_center_y + offset_y - conn_usbc_w/2, 0])
            cube([wall + 2, conn_usbc_w, conn_usbc_top_z]);

        // 2. Derecha (Y = 0): Calado DB9 J2
        translate([mx(conn_J2_center_x) + offset_x - conn_J2_w/2, -1, 0])
            cube([conn_J2_w, wall + 2, conn_J2_top_z]);

        // 3. Izquierda (Y = outer_y): Calado Alimentación J1/J5
        translate([mx(conn_J1J5_center_x) + offset_x - conn_J1J5_w/2, outer_y - wall - 1, 0])
            cube([conn_J1J5_w, wall + 2, conn_J1J5_top_z]);

        // ---- 4. VENTANA CERRADA TRADICIONAL RESTAURADA PARA J4 (SMA) ----
        // Corta de forma flotante en la pared Y=0 usando el módulo capsula_2d original
        translate([mx(conn_J4_center_x) + offset_x, -1, conn_J4_sma_z])
            rotate([-90,0,0])
            linear_extrude(height = wall + 2)
            capsula_2d(conn_J4_w, conn_J4_slot_h);
    }
}

// Render final
tapa_v1_recortada();
orejitas_tapa_v1();
